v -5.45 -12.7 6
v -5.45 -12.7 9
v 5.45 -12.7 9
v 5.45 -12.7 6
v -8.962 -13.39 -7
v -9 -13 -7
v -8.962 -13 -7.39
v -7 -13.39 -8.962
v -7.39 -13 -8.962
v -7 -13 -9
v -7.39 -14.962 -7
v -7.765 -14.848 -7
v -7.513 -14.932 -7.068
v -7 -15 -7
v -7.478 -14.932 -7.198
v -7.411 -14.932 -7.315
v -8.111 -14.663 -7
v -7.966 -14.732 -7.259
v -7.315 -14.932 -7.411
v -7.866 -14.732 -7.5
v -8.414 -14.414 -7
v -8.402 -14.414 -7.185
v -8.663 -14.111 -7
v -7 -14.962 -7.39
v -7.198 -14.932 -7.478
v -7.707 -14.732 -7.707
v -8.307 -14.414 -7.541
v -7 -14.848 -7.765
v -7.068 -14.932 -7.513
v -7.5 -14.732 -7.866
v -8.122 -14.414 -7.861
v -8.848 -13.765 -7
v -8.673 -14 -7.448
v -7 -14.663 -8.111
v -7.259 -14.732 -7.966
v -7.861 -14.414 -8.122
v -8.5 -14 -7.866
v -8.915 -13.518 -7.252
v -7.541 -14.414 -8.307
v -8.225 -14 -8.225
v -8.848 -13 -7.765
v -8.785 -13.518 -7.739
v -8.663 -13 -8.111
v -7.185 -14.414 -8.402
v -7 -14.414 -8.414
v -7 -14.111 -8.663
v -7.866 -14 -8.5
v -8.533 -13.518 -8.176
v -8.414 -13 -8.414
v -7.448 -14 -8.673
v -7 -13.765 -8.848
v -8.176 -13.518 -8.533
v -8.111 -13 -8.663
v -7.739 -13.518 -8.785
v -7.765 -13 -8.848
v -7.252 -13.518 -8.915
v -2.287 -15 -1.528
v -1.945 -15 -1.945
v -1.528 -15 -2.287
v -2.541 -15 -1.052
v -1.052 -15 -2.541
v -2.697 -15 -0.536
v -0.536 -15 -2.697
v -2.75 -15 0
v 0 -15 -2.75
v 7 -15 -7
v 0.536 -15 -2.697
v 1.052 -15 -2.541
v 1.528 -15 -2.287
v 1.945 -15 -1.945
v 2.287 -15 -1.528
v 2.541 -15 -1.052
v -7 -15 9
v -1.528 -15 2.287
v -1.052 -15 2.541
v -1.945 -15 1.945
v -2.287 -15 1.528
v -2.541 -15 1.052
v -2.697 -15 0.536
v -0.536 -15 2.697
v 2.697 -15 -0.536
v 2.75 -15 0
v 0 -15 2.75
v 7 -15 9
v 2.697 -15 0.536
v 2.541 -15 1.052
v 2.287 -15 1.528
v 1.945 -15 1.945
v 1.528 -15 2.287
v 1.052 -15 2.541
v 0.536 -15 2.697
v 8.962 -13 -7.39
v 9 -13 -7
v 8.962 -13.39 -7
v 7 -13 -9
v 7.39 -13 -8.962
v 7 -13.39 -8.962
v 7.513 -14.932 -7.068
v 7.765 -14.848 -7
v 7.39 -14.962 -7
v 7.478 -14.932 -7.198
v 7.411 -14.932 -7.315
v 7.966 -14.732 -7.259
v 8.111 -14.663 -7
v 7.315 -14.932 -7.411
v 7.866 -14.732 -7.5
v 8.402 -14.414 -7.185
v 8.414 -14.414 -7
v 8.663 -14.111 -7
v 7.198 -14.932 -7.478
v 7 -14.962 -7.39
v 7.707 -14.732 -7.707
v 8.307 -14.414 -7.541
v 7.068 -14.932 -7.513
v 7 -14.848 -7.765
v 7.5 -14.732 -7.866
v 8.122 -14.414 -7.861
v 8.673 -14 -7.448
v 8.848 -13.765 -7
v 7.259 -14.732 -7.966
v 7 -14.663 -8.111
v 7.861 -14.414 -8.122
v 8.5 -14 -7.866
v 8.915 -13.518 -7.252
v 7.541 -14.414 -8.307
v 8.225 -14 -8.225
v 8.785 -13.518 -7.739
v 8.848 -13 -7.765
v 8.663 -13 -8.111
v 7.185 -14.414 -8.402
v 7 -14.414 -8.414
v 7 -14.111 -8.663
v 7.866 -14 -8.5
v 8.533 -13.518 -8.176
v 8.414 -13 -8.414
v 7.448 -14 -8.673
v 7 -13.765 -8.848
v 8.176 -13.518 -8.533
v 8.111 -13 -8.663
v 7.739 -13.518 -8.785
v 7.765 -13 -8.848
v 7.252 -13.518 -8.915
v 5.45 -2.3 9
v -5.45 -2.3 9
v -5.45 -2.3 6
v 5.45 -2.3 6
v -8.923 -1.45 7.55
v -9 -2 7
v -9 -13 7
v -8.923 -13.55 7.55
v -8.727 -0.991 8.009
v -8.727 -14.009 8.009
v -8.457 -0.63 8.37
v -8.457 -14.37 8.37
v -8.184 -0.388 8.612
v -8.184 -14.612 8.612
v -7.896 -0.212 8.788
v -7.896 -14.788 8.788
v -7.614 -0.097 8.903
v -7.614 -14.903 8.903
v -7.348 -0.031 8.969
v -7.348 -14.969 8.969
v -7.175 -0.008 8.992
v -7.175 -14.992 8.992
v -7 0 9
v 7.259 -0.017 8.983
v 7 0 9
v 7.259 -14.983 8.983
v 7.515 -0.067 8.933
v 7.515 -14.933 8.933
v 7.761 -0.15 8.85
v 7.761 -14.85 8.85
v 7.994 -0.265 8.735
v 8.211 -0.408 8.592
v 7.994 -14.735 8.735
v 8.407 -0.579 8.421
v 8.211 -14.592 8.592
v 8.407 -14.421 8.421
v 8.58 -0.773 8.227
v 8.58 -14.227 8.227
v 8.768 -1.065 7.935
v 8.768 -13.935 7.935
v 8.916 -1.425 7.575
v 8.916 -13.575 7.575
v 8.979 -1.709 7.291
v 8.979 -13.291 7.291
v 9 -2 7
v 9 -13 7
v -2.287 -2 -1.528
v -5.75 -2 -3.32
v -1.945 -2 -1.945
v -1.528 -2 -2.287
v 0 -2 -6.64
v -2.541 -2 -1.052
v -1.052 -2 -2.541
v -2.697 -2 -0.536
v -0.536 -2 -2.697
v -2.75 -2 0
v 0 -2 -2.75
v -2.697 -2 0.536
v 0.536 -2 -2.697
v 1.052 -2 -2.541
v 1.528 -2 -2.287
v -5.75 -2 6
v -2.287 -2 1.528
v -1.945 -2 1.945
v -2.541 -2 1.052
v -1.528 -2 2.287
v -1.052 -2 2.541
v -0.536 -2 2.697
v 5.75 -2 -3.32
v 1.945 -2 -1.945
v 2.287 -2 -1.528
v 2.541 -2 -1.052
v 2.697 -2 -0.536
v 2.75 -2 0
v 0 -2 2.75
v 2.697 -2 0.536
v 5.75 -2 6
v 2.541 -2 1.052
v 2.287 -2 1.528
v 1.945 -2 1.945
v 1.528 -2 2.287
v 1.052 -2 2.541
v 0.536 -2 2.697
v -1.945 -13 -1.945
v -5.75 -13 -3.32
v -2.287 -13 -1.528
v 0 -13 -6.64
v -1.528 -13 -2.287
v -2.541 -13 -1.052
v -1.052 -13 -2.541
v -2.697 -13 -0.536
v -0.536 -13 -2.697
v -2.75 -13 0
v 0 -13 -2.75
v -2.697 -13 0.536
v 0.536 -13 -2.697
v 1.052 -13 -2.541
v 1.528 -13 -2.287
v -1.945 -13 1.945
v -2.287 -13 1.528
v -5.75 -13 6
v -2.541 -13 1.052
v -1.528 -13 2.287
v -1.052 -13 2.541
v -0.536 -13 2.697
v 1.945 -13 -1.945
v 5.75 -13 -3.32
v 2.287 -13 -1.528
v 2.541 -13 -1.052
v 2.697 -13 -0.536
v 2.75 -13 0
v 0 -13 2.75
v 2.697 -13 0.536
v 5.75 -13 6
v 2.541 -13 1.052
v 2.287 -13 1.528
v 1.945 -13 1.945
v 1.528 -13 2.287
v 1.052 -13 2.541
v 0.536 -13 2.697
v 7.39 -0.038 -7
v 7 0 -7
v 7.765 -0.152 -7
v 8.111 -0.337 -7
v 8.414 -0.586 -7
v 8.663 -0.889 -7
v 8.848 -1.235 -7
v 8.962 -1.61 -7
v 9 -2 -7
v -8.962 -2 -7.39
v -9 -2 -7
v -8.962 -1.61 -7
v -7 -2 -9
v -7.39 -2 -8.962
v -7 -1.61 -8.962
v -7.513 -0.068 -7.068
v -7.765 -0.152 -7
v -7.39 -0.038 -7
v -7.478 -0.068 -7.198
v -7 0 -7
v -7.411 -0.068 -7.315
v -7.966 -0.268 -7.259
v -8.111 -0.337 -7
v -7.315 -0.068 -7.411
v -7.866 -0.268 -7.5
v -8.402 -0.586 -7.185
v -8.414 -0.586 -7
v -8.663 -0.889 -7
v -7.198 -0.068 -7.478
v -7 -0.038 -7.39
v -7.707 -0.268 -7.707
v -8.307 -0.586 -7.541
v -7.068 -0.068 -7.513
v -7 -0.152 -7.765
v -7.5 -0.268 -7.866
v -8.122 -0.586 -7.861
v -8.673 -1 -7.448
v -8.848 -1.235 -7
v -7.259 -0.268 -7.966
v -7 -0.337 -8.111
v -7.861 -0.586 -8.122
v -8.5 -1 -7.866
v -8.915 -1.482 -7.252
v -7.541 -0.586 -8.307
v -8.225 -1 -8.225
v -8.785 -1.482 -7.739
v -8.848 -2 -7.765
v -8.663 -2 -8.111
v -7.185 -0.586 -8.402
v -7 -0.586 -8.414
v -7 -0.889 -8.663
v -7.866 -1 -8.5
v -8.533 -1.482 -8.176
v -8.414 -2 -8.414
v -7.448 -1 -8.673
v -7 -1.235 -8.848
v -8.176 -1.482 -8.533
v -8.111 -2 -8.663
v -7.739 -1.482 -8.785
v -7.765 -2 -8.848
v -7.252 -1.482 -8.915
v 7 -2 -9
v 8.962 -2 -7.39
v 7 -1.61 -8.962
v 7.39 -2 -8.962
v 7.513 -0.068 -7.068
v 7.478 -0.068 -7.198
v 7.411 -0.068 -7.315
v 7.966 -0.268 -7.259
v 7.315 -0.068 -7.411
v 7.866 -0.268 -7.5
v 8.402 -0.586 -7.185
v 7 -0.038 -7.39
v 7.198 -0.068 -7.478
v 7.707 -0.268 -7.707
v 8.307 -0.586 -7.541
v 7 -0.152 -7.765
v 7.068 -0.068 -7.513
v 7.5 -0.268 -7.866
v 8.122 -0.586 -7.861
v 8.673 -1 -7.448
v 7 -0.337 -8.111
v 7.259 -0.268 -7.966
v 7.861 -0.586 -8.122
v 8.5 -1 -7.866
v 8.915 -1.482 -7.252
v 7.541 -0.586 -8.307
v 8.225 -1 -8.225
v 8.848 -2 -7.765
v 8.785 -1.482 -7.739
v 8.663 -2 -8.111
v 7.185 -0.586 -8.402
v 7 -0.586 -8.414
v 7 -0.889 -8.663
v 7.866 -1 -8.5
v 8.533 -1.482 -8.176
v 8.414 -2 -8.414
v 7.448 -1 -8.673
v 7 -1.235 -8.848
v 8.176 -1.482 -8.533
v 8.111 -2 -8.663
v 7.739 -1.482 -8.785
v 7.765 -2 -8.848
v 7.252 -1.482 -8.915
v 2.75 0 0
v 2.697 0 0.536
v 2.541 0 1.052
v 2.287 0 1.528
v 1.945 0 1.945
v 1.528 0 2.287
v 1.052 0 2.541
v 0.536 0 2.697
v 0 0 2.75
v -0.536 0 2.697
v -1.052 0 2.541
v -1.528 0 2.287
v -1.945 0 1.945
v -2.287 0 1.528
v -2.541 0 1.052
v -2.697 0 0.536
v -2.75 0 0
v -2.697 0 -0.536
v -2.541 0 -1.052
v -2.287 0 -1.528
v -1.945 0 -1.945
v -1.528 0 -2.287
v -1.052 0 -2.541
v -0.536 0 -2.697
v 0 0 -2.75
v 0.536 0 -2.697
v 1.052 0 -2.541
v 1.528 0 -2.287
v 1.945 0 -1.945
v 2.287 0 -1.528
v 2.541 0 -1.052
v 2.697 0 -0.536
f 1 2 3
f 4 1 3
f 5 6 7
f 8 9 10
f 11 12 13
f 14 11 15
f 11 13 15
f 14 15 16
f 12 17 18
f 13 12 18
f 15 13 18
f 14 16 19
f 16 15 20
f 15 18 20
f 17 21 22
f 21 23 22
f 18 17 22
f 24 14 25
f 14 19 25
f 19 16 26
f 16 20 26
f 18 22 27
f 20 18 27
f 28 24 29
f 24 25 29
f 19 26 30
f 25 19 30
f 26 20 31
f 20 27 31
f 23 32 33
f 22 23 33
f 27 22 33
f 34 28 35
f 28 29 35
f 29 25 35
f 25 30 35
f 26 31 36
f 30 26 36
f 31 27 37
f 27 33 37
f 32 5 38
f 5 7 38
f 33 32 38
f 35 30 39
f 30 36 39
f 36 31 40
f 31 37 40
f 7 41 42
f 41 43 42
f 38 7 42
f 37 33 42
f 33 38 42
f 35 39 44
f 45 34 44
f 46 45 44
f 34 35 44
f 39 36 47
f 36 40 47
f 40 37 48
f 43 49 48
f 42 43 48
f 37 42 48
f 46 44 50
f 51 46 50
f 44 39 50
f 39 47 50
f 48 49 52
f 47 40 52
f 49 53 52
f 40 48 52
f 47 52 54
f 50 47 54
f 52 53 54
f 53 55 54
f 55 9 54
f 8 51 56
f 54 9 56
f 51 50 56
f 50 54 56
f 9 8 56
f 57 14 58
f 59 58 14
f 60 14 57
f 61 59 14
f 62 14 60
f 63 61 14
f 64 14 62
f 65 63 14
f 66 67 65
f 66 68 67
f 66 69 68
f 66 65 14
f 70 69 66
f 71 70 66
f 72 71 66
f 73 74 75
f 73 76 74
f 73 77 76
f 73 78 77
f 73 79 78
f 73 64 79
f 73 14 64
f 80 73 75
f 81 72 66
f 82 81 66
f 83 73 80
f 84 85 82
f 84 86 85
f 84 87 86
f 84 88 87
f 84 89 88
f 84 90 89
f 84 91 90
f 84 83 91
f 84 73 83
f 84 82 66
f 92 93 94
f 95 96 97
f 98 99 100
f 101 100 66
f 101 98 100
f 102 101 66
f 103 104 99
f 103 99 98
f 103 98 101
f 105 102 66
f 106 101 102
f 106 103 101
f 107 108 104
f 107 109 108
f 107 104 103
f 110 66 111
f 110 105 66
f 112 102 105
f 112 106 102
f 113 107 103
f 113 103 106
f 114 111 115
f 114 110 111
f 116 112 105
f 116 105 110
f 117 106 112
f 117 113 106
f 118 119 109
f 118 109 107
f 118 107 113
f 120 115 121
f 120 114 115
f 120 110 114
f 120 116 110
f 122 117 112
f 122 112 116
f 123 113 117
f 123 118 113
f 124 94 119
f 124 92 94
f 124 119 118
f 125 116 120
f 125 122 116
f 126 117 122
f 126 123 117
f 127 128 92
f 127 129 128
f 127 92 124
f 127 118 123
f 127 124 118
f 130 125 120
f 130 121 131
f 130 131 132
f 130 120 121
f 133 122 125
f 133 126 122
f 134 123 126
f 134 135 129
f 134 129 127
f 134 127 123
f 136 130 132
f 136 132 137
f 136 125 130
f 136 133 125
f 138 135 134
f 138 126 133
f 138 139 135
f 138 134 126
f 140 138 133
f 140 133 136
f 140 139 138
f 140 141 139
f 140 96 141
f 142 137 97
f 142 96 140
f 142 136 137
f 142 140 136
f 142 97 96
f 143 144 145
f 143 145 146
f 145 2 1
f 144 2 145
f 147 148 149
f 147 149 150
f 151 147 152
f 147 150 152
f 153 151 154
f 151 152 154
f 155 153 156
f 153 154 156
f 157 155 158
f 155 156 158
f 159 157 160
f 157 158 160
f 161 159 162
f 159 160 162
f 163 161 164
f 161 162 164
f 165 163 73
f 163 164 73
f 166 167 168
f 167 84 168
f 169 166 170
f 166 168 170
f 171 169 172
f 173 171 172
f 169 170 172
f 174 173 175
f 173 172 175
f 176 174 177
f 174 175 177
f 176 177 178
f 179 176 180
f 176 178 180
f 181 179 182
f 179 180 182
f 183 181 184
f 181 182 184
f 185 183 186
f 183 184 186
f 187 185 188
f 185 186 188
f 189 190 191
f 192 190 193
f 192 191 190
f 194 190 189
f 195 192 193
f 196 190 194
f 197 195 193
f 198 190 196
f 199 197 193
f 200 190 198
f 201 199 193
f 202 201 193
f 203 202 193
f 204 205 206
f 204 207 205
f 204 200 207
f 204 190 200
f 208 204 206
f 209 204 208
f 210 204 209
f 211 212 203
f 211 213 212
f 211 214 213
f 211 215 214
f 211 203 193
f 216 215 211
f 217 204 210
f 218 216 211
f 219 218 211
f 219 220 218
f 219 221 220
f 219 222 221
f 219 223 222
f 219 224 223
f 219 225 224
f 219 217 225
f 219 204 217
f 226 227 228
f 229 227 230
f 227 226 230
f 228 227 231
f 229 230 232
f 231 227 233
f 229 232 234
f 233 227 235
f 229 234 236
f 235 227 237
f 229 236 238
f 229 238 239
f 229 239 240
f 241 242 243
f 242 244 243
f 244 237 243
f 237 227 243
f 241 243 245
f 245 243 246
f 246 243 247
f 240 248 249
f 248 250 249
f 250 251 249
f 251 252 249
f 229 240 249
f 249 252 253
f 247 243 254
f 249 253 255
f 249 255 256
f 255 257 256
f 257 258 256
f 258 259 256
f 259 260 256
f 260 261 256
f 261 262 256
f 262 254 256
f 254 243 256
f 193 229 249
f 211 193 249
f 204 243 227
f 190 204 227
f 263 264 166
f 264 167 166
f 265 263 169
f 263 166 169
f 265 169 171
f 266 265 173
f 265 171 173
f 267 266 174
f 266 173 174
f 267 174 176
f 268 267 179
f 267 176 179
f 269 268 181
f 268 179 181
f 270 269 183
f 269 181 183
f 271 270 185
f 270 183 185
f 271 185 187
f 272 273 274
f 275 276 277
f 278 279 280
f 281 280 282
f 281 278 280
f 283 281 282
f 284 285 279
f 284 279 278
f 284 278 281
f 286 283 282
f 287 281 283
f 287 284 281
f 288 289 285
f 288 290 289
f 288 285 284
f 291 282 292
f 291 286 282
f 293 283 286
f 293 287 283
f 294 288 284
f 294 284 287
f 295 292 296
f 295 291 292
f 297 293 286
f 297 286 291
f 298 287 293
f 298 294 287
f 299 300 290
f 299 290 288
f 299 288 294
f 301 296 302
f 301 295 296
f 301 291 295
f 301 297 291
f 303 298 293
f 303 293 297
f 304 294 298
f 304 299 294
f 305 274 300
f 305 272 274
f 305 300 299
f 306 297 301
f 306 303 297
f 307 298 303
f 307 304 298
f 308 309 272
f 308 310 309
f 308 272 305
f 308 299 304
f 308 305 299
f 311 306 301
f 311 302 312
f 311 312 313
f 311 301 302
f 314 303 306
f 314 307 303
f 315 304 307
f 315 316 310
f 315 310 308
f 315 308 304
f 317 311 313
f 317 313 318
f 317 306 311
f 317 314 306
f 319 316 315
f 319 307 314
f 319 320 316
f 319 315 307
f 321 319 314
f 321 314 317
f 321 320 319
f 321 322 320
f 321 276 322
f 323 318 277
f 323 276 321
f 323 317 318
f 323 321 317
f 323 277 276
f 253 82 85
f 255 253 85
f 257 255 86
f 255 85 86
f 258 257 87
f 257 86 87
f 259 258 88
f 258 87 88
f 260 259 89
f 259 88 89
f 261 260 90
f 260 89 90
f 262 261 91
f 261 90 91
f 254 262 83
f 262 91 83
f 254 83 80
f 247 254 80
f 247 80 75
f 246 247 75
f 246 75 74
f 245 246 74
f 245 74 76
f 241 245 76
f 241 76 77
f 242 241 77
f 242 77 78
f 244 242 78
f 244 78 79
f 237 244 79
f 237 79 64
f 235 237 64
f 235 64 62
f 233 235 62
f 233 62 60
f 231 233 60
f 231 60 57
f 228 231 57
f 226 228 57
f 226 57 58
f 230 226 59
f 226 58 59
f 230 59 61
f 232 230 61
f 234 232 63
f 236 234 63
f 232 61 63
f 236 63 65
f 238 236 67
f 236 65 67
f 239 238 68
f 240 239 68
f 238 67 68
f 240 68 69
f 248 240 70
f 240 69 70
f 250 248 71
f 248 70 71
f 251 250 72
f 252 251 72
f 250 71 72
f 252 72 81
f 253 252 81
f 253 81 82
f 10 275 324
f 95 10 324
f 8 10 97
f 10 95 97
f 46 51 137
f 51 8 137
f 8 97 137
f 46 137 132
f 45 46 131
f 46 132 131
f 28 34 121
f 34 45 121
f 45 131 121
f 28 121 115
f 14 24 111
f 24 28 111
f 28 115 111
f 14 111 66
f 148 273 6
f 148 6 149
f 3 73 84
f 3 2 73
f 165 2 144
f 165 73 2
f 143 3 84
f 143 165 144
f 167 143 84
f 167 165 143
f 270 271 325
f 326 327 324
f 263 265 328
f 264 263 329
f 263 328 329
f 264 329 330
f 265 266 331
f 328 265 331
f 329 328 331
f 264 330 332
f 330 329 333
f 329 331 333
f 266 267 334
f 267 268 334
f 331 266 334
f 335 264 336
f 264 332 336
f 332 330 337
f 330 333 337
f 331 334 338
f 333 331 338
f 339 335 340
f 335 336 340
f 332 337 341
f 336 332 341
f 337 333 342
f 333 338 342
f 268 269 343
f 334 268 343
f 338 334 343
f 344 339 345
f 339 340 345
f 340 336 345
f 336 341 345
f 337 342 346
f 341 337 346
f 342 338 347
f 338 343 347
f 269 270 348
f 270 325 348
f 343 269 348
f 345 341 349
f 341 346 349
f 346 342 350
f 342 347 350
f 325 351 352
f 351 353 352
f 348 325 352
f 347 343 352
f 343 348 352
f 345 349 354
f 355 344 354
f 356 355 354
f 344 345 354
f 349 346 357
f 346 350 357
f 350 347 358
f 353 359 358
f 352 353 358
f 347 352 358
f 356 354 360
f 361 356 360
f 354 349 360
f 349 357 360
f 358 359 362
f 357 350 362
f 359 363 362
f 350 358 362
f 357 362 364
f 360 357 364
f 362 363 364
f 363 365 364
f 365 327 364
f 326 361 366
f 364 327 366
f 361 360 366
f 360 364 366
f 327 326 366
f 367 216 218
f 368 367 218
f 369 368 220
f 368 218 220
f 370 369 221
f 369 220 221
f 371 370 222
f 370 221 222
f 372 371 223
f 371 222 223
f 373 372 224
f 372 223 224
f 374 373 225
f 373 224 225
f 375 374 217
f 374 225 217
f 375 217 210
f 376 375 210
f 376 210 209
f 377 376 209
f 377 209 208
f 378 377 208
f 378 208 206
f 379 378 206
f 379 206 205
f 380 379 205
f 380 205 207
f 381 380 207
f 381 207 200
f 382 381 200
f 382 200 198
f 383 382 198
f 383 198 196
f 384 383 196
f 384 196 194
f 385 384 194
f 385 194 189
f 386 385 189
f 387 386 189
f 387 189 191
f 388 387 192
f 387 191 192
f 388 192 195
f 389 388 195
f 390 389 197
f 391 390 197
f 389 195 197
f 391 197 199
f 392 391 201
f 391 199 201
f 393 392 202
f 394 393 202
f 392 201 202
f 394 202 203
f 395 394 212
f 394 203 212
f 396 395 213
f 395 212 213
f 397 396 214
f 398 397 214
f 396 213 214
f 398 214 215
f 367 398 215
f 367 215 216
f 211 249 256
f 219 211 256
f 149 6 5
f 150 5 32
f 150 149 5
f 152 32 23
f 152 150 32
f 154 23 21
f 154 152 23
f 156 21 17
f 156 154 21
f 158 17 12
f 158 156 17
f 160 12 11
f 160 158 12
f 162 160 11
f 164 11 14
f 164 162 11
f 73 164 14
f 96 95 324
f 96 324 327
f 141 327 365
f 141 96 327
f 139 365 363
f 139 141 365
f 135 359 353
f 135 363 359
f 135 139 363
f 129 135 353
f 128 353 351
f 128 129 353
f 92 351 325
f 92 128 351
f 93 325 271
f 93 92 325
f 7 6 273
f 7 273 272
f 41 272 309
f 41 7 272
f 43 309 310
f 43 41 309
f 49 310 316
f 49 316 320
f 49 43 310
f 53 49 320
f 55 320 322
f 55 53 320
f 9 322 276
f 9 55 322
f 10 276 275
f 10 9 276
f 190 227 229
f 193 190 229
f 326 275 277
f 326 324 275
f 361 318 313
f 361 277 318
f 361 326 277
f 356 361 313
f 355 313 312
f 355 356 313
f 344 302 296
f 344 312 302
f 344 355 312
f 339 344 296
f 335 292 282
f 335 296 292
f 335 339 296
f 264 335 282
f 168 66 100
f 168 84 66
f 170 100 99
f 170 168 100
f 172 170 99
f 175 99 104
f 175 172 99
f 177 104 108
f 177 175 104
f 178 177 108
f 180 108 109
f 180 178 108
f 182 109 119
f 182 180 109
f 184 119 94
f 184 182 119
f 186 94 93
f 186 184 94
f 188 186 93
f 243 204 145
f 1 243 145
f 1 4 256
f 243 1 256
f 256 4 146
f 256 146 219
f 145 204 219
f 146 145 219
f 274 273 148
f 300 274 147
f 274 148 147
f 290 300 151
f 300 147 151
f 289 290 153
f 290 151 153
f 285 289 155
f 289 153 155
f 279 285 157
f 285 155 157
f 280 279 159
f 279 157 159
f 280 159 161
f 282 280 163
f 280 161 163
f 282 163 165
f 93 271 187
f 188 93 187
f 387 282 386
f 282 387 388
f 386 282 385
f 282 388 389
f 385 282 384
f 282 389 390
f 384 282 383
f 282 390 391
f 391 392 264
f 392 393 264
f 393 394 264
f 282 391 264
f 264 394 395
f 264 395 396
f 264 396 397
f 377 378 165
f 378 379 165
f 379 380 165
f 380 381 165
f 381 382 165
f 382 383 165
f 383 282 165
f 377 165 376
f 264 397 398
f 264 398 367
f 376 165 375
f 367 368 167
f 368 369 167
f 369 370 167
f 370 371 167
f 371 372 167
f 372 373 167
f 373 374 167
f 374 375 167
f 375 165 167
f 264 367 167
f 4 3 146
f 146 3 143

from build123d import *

# Parameters (mm, degrees)
F0_W      = 18
F0_H      = 18
F1_DEPTH  = 15
F5_DEPTH  = 11
F6_R      = 2.75
F7_DEPTH  = 15.001
F8_R      = 2
F9_W      = 11.5
F9_H      = 11
F9_W_2    = 10.9
F9_H_2    = 10.4
F10_DEPTH = 3


with BuildPart() as f1:
    # F0 (on Front) → F1 (new body)
    with BuildSketch(Plane.XZ):
        Rectangle(F0_W, F0_H)
    extrude(amount=F1_DEPTH)

    # F3 (on offset) → F5 (cut, through all)
    with BuildSketch(Plane.XZ.offset(13)):
        Polygon((5.75, -3.319764), (5.75, 3.319764), (5.75, 9.680236), (-5.75, 9.680236), (-5.75, 3.680236), (-5.75, -3.319764), (0, -6.639528), align=None)
    extrude(amount=-F5_DEPTH, mode=Mode.SUBTRACT)

    # F6 (on face) → F7 (cut, through all)
    with BuildSketch(Plane.XZ.offset(15)):
        Circle(F6_R)
    extrude(amount=-F7_DEPTH, mode=Mode.SUBTRACT)

    # F8
    f8_edges = [f1.edges().sort_by_distance(p)[0] for p in [
        (-9, -7.5, 9),
        (-9, -7.5, -9),
        (-9, 0, 0),
        (-9, -15, 0),
        (9, -7.5, -9),
        (9, -7.5, 9),
        (9, 0, 0),
        (9, -15, 0),
        (0, 0, -9),
        (0, -15, -9),
    ]]
    fillet(f8_edges, radius=F8_R)

    # F9 (on face) → F10 (join)
    with BuildSketch(Plane.XY.offset(9)):
        with Locations((0, -7.5)):
            Rectangle(F9_W, F9_H)
        with Locations((0, -7.5)):
            Rectangle(F9_W_2, F9_H_2, mode=Mode.SUBTRACT)
    extrude(amount=-F10_DEPTH)


solid = f1.part
